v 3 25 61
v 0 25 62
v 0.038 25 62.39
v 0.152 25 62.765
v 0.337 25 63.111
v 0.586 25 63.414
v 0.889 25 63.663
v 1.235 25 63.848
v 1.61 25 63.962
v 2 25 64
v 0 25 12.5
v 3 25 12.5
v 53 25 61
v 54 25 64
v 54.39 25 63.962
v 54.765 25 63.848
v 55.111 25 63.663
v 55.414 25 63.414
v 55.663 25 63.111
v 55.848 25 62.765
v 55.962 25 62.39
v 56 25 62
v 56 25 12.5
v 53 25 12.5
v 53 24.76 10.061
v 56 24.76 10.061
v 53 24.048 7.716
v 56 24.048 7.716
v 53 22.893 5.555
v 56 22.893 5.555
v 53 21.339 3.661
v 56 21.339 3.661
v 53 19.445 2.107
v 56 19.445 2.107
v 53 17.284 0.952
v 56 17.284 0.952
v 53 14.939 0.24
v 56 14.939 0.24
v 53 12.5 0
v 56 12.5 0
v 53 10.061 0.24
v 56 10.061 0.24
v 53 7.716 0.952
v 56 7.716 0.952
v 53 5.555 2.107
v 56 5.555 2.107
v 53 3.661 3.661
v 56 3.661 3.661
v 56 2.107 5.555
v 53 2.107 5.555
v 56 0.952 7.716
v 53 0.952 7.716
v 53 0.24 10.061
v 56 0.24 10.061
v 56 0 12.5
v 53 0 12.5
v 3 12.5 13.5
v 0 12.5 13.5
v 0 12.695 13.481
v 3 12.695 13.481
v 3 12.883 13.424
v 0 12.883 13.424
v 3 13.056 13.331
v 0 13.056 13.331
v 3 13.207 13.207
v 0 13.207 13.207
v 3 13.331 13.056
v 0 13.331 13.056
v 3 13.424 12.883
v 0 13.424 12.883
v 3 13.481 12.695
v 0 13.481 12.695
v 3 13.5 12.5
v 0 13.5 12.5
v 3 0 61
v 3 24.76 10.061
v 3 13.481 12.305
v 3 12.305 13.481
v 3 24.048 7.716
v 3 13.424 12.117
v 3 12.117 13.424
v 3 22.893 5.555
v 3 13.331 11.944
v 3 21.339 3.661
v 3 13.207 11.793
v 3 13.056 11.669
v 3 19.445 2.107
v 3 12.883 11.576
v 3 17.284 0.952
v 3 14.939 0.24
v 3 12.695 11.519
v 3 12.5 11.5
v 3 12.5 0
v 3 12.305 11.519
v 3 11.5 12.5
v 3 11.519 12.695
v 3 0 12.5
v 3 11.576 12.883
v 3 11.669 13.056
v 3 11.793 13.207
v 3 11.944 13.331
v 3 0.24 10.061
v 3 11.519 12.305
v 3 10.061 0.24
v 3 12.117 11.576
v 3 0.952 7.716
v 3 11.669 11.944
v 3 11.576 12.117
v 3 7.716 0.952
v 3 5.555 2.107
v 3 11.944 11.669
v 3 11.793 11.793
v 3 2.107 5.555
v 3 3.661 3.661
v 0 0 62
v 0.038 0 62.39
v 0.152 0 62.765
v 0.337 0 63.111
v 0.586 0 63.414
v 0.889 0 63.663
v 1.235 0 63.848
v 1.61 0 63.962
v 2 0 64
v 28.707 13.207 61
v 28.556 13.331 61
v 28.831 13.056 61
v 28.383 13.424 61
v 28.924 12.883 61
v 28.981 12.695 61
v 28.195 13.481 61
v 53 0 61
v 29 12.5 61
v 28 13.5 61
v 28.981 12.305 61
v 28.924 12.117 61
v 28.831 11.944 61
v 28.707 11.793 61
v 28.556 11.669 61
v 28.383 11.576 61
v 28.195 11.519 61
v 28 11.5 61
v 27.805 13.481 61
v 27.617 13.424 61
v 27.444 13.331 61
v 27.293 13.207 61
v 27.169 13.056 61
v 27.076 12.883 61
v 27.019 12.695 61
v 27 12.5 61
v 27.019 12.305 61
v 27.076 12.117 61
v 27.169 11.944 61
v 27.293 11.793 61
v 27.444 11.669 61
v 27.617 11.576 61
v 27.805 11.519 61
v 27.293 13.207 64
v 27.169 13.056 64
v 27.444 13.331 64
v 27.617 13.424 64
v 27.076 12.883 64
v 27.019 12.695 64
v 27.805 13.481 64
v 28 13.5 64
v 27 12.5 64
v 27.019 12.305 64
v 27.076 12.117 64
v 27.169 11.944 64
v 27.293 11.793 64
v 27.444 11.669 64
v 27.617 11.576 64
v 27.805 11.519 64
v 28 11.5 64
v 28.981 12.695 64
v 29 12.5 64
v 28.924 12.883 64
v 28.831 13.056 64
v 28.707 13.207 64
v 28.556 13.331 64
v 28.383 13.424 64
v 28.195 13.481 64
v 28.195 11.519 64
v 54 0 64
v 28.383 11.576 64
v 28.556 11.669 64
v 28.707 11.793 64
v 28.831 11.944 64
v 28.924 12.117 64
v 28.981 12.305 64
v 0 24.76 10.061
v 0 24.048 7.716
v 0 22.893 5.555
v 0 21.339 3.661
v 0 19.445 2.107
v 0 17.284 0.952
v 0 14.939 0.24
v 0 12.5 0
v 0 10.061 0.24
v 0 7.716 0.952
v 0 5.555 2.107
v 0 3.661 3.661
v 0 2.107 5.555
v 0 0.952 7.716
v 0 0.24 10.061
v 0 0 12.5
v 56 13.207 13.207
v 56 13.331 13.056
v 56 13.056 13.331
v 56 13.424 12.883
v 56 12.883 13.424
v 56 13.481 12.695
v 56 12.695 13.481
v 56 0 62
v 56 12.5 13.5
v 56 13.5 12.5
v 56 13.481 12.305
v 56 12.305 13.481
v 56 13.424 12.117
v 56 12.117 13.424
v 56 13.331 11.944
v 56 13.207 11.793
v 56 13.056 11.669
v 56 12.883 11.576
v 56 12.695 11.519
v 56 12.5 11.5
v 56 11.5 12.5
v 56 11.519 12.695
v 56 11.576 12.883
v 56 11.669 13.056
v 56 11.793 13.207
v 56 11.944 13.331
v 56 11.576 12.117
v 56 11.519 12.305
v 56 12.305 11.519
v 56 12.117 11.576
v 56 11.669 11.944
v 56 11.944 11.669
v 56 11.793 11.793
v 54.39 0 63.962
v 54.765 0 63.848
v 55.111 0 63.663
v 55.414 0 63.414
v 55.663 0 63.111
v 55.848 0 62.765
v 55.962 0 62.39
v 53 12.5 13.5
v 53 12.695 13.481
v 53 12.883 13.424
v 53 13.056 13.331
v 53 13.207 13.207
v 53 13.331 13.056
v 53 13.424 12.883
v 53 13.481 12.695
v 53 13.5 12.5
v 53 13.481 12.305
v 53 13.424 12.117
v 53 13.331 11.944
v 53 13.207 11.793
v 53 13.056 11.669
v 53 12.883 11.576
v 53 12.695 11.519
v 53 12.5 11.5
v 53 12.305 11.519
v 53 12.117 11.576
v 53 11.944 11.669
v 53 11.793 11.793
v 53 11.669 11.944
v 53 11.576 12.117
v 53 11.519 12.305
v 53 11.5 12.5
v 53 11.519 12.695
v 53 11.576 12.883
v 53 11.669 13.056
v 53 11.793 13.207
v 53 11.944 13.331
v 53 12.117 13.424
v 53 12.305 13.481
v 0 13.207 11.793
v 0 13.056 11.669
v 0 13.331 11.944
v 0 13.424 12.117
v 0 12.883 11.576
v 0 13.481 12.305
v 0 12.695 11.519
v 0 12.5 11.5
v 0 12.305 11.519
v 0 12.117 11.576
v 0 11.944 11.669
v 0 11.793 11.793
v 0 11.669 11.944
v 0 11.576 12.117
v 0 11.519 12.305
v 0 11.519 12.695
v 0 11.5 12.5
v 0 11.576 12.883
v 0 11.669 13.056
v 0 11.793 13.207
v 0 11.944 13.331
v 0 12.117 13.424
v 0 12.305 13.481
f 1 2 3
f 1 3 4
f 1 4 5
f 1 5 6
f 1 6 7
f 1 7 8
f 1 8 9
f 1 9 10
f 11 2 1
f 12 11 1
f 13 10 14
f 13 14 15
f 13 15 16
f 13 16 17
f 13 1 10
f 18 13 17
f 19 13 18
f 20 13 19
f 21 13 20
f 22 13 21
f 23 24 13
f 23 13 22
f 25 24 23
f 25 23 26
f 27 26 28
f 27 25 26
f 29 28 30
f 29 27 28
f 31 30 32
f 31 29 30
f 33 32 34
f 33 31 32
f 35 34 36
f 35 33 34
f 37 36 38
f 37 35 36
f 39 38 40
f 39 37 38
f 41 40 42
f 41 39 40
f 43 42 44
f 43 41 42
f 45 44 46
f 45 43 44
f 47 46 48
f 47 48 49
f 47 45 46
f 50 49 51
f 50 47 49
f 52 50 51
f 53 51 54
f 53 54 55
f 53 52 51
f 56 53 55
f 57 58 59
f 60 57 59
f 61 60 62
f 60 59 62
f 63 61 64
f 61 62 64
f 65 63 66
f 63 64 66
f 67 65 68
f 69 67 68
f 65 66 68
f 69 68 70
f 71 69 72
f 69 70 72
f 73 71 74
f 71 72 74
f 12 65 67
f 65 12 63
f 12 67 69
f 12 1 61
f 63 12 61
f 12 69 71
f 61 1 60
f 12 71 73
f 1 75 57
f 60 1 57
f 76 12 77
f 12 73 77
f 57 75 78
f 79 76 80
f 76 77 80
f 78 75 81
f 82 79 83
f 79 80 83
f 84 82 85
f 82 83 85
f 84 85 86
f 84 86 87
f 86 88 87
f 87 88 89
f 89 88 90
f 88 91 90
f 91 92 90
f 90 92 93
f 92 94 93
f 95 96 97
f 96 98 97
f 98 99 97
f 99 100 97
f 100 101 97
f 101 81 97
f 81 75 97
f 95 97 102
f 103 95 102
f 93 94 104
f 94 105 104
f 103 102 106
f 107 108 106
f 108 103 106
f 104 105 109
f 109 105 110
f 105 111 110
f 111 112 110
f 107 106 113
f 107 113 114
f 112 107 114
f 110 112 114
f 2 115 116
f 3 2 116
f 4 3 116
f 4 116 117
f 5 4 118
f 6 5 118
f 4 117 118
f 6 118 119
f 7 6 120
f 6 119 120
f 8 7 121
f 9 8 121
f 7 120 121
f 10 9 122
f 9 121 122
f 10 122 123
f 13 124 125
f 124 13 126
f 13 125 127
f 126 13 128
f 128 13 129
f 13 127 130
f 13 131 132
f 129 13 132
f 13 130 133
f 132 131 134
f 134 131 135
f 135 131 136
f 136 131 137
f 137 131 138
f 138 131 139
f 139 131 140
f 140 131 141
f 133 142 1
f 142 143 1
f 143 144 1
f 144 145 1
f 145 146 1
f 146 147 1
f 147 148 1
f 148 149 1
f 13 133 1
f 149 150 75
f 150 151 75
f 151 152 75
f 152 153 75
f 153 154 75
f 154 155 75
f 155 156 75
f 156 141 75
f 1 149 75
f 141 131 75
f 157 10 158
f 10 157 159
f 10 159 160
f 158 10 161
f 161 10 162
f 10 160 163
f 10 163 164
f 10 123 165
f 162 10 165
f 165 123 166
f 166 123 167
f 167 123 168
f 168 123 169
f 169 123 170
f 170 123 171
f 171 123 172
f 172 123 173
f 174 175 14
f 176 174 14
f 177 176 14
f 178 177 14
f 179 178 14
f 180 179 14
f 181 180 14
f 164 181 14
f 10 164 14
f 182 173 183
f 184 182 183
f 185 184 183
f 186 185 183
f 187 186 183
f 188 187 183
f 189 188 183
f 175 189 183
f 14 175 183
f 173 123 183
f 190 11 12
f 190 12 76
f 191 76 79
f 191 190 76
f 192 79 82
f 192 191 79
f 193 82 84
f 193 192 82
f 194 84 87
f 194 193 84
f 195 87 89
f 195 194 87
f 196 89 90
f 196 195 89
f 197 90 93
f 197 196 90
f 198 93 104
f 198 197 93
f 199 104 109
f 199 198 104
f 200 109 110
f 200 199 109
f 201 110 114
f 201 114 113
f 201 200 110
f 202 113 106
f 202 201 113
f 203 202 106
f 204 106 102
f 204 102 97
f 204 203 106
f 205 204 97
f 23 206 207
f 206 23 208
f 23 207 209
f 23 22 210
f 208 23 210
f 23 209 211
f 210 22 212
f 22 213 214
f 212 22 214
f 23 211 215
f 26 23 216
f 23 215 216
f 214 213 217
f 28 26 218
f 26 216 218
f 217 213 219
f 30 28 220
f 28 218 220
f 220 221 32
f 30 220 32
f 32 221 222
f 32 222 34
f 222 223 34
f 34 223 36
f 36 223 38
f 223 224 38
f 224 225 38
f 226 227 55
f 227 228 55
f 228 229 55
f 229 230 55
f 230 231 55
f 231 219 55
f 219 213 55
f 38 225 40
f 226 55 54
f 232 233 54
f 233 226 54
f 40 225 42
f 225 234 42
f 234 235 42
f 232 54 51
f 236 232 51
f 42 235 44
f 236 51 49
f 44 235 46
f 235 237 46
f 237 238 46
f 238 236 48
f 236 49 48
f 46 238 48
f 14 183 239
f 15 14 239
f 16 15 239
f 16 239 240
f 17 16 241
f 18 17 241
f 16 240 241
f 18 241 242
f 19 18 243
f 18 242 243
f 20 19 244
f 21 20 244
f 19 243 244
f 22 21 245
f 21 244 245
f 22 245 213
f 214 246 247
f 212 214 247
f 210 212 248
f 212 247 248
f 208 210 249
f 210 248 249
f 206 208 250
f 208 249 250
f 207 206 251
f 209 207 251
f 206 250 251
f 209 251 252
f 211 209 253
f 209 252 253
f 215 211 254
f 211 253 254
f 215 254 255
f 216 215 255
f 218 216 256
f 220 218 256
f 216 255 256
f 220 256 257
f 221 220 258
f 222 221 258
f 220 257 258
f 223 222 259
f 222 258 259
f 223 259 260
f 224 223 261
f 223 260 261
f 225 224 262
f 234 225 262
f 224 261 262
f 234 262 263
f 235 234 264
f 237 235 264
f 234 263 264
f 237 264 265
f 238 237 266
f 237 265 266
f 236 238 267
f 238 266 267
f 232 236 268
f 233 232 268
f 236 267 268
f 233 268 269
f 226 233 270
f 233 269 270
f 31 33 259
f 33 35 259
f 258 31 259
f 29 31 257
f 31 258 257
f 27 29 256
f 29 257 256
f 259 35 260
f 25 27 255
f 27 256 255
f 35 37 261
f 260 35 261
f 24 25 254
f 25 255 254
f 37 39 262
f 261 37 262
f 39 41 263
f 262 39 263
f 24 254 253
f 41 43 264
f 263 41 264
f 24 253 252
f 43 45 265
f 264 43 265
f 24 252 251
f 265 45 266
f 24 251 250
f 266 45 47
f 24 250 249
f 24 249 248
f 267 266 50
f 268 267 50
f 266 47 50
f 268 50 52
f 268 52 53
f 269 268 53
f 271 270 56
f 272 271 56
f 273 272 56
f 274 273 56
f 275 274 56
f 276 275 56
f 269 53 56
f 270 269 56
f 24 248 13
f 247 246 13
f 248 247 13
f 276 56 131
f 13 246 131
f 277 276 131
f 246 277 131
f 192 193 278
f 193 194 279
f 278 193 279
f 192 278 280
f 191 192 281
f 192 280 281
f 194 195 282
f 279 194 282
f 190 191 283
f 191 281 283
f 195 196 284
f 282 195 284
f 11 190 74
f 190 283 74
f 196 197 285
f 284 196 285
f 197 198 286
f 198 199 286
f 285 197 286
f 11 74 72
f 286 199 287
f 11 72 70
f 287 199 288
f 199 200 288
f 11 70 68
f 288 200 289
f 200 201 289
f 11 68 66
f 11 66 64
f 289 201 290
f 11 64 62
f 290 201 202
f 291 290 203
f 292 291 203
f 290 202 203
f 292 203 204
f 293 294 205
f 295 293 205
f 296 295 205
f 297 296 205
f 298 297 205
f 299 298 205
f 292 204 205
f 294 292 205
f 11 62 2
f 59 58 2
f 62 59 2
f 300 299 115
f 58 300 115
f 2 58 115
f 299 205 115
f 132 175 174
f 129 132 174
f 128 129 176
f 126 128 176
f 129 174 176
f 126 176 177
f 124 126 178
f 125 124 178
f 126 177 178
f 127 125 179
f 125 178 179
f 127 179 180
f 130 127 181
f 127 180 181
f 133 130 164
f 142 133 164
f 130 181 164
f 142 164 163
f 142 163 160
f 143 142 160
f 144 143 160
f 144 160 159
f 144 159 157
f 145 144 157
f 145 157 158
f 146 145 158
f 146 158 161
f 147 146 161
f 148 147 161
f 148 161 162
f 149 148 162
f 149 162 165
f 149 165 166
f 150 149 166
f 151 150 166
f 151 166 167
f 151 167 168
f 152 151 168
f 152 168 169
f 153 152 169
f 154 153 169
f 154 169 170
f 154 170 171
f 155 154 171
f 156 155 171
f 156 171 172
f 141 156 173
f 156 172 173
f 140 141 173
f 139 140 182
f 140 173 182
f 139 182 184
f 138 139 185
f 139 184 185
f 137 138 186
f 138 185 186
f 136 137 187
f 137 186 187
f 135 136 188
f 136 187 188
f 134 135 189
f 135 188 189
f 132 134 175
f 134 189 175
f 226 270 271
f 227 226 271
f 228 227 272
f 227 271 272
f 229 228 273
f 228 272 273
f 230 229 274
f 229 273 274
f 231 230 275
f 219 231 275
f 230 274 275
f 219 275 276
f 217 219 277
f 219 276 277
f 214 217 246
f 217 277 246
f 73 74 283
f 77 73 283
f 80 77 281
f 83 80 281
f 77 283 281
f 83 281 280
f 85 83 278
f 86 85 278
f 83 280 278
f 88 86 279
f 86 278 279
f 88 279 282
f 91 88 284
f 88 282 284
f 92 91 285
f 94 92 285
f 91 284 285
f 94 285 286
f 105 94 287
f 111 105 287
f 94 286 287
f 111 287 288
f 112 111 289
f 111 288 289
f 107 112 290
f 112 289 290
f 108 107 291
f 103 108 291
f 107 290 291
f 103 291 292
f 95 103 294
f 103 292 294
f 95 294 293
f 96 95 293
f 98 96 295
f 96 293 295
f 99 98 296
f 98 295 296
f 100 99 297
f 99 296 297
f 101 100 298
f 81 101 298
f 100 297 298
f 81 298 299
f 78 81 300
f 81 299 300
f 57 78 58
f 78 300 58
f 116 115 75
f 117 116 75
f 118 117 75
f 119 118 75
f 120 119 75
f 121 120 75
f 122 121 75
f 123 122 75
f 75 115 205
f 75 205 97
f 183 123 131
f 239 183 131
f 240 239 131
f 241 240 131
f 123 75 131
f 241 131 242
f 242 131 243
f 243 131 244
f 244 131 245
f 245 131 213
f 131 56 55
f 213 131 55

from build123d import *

# Parameters (mm, degrees)
BOSS_EXTRUDE1_DEPTH = 25
FILLET1_RADIUS      = 12.5
FILLET1_LENGTH      = 3
FILLET2_RADIUS      = 12.5
FILLET2_LENGTH      = 3
CUT_EXTRUDE1_DEPTH  = 89.639720216
CUT_EXTRUDE2_REACH  = 90.64


with BuildPart() as part:
    # Sketch1 → Boss-Extrude1 (new body)
    with BuildSketch(Plane(origin=(0, 0, 0), x_dir=(1, 0, 0), z_dir=(0, 1, 0))):
        with BuildLine():
            Line((0, 0), (0, -62))
            ThreePointArc((0, -62), (0.585786438, -63.414213562), (2, -64))
            Line((2, -64), (54, -64))
            ThreePointArc((54, -64), (55.414213562, -63.414213562), (56, -62))
            Line((56, -62), (56, 0))
            Line((56, 0), (53, 0))
            Line((53, 0), (53, -61))
            Line((53, -61), (3, -61))
            Line((3, -61), (3, 0))
            Line((3, 0), (0, 0))
        make_face()
    extrude(amount=BOSS_EXTRUDE1_DEPTH)

    # Fillet1: full round fillet: the end face becomes a half cylinder, R = half its width
    fillet1_face = Plane((1.5, 12.5, 0), x_dir=(-1, 0, 0), z_dir=(0, 0, -1))  # on the end face: x along it, z out of the body
    fillet1_slab = fillet1_face.offset(-FILLET1_RADIUS / 2) * Box(FILLET1_LENGTH, 2 * FILLET1_RADIUS, FILLET1_RADIUS, mode=Mode.PRIVATE)  # the body's end, R deep
    fillet1_round = Plane((1.5, 12.5, 12.5), x_dir=(0, 0, -1), z_dir=(-1, 0, 0)) * Cylinder(FILLET1_RADIUS, FILLET1_LENGTH, mode=Mode.PRIVATE)  # its axis R under the face
    add(fillet1_slab - fillet1_round, mode=Mode.SUBTRACT)

    # Fillet2: full round fillet: the end face becomes a half cylinder, R = half its width
    fillet2_face = Plane((54.5, 12.5, 0), x_dir=(-1, 0, 0), z_dir=(0, 0, -1))  # on the end face: x along it, z out of the body
    fillet2_slab = fillet2_face.offset(-FILLET2_RADIUS / 2) * Box(FILLET2_LENGTH, 2 * FILLET2_RADIUS, FILLET2_RADIUS, mode=Mode.PRIVATE)  # the body's end, R deep
    fillet2_round = Plane((54.5, 12.5, 12.5), x_dir=(0, 0, -1), z_dir=(-1, 0, 0)) * Cylinder(FILLET2_RADIUS, FILLET2_LENGTH, mode=Mode.PRIVATE)  # its axis R under the face
    add(fillet2_slab - fillet2_round, mode=Mode.SUBTRACT)

    # Sketch3 → Cut-Extrude1 (cut, through all)
    with BuildSketch(Plane.ZY):
        with BuildLine():
            ThreePointArc((13.5, 12.5), (13.207106781, 13.207106781), (12.5, 13.5))
            Line((12.5, 13.5), (12.5, 11.5))
            ThreePointArc((12.5, 11.5), (13.207106781, 11.792893219), (13.5, 12.5))
        make_face()
        with BuildLine():
            Line((12.5, 11.5), (12.5, 13.5))
            ThreePointArc((12.5, 13.5), (11.5, 12.5), (12.5, 11.5))
        make_face()
    extrude(amount=-CUT_EXTRUDE1_DEPTH, mode=Mode.SUBTRACT)

    # Sketch4 → Cut-Extrude2 (cut, up to next)
    with BuildSketch(Plane.XY.offset(64), mode=Mode.PRIVATE) as cut_extrude2_sk1:
        with BuildLine():
            ThreePointArc((29, 12.5), (28, 13.5), (27, 12.5))
            Line((27, 12.5), (29, 12.5))
        make_face()
    cut_extrude2_tool1 = extrude(cut_extrude2_sk1.sketch, amount=-CUT_EXTRUDE2_REACH, mode=Mode.PRIVATE) & part.part
    # Sketch4 → Cut-Extrude2 (cut, up to next)
    with BuildSketch(Plane.XY.offset(64), mode=Mode.PRIVATE) as cut_extrude2_sk2:
        with BuildLine():
            Line((29, 12.5), (27, 12.5))
            ThreePointArc((27, 12.5), (28, 11.5), (29, 12.5))
        make_face()
    cut_extrude2_tool2 = extrude(cut_extrude2_sk2.sketch, amount=-CUT_EXTRUDE2_REACH, mode=Mode.PRIVATE) & part.part
    # Sketch4 → Cut-Extrude2 (cut, up to next)
    with BuildSketch(Plane.XY.offset(64), mode=Mode.PRIVATE) as cut_extrude2_sk3:
        with BuildLine():
            ThreePointArc((29, 12.5), (28, 13.5), (27, 12.5))
            Line((27, 12.5), (29, 12.5))
        make_face()
    cut_extrude2_tool3 = extrude(cut_extrude2_sk3.sketch, amount=-CUT_EXTRUDE2_REACH, mode=Mode.PRIVATE) & part.part
    # Sketch4 → Cut-Extrude2 (cut, up to next)
    with BuildSketch(Plane.XY.offset(64), mode=Mode.PRIVATE) as cut_extrude2_sk4:
        with BuildLine():
            Line((29, 12.5), (27, 12.5))
            ThreePointArc((27, 12.5), (28, 11.5), (29, 12.5))
        make_face()
    cut_extrude2_tool4 = extrude(cut_extrude2_sk4.sketch, amount=-CUT_EXTRUDE2_REACH, mode=Mode.PRIVATE) & part.part
    add(cut_extrude2_tool1.solids().sort_by_distance((28, 12.924413, 64))[0], mode=Mode.SUBTRACT)
    add(cut_extrude2_tool2.solids().sort_by_distance((28, 12.075587, 64))[0], mode=Mode.SUBTRACT)
    add(cut_extrude2_tool3.solids().sort_by_distance((28, 12.924413, 64))[0], mode=Mode.SUBTRACT)
    add(cut_extrude2_tool4.solids().sort_by_distance((28, 12.075587, 64))[0], mode=Mode.SUBTRACT)


solid = part.part
